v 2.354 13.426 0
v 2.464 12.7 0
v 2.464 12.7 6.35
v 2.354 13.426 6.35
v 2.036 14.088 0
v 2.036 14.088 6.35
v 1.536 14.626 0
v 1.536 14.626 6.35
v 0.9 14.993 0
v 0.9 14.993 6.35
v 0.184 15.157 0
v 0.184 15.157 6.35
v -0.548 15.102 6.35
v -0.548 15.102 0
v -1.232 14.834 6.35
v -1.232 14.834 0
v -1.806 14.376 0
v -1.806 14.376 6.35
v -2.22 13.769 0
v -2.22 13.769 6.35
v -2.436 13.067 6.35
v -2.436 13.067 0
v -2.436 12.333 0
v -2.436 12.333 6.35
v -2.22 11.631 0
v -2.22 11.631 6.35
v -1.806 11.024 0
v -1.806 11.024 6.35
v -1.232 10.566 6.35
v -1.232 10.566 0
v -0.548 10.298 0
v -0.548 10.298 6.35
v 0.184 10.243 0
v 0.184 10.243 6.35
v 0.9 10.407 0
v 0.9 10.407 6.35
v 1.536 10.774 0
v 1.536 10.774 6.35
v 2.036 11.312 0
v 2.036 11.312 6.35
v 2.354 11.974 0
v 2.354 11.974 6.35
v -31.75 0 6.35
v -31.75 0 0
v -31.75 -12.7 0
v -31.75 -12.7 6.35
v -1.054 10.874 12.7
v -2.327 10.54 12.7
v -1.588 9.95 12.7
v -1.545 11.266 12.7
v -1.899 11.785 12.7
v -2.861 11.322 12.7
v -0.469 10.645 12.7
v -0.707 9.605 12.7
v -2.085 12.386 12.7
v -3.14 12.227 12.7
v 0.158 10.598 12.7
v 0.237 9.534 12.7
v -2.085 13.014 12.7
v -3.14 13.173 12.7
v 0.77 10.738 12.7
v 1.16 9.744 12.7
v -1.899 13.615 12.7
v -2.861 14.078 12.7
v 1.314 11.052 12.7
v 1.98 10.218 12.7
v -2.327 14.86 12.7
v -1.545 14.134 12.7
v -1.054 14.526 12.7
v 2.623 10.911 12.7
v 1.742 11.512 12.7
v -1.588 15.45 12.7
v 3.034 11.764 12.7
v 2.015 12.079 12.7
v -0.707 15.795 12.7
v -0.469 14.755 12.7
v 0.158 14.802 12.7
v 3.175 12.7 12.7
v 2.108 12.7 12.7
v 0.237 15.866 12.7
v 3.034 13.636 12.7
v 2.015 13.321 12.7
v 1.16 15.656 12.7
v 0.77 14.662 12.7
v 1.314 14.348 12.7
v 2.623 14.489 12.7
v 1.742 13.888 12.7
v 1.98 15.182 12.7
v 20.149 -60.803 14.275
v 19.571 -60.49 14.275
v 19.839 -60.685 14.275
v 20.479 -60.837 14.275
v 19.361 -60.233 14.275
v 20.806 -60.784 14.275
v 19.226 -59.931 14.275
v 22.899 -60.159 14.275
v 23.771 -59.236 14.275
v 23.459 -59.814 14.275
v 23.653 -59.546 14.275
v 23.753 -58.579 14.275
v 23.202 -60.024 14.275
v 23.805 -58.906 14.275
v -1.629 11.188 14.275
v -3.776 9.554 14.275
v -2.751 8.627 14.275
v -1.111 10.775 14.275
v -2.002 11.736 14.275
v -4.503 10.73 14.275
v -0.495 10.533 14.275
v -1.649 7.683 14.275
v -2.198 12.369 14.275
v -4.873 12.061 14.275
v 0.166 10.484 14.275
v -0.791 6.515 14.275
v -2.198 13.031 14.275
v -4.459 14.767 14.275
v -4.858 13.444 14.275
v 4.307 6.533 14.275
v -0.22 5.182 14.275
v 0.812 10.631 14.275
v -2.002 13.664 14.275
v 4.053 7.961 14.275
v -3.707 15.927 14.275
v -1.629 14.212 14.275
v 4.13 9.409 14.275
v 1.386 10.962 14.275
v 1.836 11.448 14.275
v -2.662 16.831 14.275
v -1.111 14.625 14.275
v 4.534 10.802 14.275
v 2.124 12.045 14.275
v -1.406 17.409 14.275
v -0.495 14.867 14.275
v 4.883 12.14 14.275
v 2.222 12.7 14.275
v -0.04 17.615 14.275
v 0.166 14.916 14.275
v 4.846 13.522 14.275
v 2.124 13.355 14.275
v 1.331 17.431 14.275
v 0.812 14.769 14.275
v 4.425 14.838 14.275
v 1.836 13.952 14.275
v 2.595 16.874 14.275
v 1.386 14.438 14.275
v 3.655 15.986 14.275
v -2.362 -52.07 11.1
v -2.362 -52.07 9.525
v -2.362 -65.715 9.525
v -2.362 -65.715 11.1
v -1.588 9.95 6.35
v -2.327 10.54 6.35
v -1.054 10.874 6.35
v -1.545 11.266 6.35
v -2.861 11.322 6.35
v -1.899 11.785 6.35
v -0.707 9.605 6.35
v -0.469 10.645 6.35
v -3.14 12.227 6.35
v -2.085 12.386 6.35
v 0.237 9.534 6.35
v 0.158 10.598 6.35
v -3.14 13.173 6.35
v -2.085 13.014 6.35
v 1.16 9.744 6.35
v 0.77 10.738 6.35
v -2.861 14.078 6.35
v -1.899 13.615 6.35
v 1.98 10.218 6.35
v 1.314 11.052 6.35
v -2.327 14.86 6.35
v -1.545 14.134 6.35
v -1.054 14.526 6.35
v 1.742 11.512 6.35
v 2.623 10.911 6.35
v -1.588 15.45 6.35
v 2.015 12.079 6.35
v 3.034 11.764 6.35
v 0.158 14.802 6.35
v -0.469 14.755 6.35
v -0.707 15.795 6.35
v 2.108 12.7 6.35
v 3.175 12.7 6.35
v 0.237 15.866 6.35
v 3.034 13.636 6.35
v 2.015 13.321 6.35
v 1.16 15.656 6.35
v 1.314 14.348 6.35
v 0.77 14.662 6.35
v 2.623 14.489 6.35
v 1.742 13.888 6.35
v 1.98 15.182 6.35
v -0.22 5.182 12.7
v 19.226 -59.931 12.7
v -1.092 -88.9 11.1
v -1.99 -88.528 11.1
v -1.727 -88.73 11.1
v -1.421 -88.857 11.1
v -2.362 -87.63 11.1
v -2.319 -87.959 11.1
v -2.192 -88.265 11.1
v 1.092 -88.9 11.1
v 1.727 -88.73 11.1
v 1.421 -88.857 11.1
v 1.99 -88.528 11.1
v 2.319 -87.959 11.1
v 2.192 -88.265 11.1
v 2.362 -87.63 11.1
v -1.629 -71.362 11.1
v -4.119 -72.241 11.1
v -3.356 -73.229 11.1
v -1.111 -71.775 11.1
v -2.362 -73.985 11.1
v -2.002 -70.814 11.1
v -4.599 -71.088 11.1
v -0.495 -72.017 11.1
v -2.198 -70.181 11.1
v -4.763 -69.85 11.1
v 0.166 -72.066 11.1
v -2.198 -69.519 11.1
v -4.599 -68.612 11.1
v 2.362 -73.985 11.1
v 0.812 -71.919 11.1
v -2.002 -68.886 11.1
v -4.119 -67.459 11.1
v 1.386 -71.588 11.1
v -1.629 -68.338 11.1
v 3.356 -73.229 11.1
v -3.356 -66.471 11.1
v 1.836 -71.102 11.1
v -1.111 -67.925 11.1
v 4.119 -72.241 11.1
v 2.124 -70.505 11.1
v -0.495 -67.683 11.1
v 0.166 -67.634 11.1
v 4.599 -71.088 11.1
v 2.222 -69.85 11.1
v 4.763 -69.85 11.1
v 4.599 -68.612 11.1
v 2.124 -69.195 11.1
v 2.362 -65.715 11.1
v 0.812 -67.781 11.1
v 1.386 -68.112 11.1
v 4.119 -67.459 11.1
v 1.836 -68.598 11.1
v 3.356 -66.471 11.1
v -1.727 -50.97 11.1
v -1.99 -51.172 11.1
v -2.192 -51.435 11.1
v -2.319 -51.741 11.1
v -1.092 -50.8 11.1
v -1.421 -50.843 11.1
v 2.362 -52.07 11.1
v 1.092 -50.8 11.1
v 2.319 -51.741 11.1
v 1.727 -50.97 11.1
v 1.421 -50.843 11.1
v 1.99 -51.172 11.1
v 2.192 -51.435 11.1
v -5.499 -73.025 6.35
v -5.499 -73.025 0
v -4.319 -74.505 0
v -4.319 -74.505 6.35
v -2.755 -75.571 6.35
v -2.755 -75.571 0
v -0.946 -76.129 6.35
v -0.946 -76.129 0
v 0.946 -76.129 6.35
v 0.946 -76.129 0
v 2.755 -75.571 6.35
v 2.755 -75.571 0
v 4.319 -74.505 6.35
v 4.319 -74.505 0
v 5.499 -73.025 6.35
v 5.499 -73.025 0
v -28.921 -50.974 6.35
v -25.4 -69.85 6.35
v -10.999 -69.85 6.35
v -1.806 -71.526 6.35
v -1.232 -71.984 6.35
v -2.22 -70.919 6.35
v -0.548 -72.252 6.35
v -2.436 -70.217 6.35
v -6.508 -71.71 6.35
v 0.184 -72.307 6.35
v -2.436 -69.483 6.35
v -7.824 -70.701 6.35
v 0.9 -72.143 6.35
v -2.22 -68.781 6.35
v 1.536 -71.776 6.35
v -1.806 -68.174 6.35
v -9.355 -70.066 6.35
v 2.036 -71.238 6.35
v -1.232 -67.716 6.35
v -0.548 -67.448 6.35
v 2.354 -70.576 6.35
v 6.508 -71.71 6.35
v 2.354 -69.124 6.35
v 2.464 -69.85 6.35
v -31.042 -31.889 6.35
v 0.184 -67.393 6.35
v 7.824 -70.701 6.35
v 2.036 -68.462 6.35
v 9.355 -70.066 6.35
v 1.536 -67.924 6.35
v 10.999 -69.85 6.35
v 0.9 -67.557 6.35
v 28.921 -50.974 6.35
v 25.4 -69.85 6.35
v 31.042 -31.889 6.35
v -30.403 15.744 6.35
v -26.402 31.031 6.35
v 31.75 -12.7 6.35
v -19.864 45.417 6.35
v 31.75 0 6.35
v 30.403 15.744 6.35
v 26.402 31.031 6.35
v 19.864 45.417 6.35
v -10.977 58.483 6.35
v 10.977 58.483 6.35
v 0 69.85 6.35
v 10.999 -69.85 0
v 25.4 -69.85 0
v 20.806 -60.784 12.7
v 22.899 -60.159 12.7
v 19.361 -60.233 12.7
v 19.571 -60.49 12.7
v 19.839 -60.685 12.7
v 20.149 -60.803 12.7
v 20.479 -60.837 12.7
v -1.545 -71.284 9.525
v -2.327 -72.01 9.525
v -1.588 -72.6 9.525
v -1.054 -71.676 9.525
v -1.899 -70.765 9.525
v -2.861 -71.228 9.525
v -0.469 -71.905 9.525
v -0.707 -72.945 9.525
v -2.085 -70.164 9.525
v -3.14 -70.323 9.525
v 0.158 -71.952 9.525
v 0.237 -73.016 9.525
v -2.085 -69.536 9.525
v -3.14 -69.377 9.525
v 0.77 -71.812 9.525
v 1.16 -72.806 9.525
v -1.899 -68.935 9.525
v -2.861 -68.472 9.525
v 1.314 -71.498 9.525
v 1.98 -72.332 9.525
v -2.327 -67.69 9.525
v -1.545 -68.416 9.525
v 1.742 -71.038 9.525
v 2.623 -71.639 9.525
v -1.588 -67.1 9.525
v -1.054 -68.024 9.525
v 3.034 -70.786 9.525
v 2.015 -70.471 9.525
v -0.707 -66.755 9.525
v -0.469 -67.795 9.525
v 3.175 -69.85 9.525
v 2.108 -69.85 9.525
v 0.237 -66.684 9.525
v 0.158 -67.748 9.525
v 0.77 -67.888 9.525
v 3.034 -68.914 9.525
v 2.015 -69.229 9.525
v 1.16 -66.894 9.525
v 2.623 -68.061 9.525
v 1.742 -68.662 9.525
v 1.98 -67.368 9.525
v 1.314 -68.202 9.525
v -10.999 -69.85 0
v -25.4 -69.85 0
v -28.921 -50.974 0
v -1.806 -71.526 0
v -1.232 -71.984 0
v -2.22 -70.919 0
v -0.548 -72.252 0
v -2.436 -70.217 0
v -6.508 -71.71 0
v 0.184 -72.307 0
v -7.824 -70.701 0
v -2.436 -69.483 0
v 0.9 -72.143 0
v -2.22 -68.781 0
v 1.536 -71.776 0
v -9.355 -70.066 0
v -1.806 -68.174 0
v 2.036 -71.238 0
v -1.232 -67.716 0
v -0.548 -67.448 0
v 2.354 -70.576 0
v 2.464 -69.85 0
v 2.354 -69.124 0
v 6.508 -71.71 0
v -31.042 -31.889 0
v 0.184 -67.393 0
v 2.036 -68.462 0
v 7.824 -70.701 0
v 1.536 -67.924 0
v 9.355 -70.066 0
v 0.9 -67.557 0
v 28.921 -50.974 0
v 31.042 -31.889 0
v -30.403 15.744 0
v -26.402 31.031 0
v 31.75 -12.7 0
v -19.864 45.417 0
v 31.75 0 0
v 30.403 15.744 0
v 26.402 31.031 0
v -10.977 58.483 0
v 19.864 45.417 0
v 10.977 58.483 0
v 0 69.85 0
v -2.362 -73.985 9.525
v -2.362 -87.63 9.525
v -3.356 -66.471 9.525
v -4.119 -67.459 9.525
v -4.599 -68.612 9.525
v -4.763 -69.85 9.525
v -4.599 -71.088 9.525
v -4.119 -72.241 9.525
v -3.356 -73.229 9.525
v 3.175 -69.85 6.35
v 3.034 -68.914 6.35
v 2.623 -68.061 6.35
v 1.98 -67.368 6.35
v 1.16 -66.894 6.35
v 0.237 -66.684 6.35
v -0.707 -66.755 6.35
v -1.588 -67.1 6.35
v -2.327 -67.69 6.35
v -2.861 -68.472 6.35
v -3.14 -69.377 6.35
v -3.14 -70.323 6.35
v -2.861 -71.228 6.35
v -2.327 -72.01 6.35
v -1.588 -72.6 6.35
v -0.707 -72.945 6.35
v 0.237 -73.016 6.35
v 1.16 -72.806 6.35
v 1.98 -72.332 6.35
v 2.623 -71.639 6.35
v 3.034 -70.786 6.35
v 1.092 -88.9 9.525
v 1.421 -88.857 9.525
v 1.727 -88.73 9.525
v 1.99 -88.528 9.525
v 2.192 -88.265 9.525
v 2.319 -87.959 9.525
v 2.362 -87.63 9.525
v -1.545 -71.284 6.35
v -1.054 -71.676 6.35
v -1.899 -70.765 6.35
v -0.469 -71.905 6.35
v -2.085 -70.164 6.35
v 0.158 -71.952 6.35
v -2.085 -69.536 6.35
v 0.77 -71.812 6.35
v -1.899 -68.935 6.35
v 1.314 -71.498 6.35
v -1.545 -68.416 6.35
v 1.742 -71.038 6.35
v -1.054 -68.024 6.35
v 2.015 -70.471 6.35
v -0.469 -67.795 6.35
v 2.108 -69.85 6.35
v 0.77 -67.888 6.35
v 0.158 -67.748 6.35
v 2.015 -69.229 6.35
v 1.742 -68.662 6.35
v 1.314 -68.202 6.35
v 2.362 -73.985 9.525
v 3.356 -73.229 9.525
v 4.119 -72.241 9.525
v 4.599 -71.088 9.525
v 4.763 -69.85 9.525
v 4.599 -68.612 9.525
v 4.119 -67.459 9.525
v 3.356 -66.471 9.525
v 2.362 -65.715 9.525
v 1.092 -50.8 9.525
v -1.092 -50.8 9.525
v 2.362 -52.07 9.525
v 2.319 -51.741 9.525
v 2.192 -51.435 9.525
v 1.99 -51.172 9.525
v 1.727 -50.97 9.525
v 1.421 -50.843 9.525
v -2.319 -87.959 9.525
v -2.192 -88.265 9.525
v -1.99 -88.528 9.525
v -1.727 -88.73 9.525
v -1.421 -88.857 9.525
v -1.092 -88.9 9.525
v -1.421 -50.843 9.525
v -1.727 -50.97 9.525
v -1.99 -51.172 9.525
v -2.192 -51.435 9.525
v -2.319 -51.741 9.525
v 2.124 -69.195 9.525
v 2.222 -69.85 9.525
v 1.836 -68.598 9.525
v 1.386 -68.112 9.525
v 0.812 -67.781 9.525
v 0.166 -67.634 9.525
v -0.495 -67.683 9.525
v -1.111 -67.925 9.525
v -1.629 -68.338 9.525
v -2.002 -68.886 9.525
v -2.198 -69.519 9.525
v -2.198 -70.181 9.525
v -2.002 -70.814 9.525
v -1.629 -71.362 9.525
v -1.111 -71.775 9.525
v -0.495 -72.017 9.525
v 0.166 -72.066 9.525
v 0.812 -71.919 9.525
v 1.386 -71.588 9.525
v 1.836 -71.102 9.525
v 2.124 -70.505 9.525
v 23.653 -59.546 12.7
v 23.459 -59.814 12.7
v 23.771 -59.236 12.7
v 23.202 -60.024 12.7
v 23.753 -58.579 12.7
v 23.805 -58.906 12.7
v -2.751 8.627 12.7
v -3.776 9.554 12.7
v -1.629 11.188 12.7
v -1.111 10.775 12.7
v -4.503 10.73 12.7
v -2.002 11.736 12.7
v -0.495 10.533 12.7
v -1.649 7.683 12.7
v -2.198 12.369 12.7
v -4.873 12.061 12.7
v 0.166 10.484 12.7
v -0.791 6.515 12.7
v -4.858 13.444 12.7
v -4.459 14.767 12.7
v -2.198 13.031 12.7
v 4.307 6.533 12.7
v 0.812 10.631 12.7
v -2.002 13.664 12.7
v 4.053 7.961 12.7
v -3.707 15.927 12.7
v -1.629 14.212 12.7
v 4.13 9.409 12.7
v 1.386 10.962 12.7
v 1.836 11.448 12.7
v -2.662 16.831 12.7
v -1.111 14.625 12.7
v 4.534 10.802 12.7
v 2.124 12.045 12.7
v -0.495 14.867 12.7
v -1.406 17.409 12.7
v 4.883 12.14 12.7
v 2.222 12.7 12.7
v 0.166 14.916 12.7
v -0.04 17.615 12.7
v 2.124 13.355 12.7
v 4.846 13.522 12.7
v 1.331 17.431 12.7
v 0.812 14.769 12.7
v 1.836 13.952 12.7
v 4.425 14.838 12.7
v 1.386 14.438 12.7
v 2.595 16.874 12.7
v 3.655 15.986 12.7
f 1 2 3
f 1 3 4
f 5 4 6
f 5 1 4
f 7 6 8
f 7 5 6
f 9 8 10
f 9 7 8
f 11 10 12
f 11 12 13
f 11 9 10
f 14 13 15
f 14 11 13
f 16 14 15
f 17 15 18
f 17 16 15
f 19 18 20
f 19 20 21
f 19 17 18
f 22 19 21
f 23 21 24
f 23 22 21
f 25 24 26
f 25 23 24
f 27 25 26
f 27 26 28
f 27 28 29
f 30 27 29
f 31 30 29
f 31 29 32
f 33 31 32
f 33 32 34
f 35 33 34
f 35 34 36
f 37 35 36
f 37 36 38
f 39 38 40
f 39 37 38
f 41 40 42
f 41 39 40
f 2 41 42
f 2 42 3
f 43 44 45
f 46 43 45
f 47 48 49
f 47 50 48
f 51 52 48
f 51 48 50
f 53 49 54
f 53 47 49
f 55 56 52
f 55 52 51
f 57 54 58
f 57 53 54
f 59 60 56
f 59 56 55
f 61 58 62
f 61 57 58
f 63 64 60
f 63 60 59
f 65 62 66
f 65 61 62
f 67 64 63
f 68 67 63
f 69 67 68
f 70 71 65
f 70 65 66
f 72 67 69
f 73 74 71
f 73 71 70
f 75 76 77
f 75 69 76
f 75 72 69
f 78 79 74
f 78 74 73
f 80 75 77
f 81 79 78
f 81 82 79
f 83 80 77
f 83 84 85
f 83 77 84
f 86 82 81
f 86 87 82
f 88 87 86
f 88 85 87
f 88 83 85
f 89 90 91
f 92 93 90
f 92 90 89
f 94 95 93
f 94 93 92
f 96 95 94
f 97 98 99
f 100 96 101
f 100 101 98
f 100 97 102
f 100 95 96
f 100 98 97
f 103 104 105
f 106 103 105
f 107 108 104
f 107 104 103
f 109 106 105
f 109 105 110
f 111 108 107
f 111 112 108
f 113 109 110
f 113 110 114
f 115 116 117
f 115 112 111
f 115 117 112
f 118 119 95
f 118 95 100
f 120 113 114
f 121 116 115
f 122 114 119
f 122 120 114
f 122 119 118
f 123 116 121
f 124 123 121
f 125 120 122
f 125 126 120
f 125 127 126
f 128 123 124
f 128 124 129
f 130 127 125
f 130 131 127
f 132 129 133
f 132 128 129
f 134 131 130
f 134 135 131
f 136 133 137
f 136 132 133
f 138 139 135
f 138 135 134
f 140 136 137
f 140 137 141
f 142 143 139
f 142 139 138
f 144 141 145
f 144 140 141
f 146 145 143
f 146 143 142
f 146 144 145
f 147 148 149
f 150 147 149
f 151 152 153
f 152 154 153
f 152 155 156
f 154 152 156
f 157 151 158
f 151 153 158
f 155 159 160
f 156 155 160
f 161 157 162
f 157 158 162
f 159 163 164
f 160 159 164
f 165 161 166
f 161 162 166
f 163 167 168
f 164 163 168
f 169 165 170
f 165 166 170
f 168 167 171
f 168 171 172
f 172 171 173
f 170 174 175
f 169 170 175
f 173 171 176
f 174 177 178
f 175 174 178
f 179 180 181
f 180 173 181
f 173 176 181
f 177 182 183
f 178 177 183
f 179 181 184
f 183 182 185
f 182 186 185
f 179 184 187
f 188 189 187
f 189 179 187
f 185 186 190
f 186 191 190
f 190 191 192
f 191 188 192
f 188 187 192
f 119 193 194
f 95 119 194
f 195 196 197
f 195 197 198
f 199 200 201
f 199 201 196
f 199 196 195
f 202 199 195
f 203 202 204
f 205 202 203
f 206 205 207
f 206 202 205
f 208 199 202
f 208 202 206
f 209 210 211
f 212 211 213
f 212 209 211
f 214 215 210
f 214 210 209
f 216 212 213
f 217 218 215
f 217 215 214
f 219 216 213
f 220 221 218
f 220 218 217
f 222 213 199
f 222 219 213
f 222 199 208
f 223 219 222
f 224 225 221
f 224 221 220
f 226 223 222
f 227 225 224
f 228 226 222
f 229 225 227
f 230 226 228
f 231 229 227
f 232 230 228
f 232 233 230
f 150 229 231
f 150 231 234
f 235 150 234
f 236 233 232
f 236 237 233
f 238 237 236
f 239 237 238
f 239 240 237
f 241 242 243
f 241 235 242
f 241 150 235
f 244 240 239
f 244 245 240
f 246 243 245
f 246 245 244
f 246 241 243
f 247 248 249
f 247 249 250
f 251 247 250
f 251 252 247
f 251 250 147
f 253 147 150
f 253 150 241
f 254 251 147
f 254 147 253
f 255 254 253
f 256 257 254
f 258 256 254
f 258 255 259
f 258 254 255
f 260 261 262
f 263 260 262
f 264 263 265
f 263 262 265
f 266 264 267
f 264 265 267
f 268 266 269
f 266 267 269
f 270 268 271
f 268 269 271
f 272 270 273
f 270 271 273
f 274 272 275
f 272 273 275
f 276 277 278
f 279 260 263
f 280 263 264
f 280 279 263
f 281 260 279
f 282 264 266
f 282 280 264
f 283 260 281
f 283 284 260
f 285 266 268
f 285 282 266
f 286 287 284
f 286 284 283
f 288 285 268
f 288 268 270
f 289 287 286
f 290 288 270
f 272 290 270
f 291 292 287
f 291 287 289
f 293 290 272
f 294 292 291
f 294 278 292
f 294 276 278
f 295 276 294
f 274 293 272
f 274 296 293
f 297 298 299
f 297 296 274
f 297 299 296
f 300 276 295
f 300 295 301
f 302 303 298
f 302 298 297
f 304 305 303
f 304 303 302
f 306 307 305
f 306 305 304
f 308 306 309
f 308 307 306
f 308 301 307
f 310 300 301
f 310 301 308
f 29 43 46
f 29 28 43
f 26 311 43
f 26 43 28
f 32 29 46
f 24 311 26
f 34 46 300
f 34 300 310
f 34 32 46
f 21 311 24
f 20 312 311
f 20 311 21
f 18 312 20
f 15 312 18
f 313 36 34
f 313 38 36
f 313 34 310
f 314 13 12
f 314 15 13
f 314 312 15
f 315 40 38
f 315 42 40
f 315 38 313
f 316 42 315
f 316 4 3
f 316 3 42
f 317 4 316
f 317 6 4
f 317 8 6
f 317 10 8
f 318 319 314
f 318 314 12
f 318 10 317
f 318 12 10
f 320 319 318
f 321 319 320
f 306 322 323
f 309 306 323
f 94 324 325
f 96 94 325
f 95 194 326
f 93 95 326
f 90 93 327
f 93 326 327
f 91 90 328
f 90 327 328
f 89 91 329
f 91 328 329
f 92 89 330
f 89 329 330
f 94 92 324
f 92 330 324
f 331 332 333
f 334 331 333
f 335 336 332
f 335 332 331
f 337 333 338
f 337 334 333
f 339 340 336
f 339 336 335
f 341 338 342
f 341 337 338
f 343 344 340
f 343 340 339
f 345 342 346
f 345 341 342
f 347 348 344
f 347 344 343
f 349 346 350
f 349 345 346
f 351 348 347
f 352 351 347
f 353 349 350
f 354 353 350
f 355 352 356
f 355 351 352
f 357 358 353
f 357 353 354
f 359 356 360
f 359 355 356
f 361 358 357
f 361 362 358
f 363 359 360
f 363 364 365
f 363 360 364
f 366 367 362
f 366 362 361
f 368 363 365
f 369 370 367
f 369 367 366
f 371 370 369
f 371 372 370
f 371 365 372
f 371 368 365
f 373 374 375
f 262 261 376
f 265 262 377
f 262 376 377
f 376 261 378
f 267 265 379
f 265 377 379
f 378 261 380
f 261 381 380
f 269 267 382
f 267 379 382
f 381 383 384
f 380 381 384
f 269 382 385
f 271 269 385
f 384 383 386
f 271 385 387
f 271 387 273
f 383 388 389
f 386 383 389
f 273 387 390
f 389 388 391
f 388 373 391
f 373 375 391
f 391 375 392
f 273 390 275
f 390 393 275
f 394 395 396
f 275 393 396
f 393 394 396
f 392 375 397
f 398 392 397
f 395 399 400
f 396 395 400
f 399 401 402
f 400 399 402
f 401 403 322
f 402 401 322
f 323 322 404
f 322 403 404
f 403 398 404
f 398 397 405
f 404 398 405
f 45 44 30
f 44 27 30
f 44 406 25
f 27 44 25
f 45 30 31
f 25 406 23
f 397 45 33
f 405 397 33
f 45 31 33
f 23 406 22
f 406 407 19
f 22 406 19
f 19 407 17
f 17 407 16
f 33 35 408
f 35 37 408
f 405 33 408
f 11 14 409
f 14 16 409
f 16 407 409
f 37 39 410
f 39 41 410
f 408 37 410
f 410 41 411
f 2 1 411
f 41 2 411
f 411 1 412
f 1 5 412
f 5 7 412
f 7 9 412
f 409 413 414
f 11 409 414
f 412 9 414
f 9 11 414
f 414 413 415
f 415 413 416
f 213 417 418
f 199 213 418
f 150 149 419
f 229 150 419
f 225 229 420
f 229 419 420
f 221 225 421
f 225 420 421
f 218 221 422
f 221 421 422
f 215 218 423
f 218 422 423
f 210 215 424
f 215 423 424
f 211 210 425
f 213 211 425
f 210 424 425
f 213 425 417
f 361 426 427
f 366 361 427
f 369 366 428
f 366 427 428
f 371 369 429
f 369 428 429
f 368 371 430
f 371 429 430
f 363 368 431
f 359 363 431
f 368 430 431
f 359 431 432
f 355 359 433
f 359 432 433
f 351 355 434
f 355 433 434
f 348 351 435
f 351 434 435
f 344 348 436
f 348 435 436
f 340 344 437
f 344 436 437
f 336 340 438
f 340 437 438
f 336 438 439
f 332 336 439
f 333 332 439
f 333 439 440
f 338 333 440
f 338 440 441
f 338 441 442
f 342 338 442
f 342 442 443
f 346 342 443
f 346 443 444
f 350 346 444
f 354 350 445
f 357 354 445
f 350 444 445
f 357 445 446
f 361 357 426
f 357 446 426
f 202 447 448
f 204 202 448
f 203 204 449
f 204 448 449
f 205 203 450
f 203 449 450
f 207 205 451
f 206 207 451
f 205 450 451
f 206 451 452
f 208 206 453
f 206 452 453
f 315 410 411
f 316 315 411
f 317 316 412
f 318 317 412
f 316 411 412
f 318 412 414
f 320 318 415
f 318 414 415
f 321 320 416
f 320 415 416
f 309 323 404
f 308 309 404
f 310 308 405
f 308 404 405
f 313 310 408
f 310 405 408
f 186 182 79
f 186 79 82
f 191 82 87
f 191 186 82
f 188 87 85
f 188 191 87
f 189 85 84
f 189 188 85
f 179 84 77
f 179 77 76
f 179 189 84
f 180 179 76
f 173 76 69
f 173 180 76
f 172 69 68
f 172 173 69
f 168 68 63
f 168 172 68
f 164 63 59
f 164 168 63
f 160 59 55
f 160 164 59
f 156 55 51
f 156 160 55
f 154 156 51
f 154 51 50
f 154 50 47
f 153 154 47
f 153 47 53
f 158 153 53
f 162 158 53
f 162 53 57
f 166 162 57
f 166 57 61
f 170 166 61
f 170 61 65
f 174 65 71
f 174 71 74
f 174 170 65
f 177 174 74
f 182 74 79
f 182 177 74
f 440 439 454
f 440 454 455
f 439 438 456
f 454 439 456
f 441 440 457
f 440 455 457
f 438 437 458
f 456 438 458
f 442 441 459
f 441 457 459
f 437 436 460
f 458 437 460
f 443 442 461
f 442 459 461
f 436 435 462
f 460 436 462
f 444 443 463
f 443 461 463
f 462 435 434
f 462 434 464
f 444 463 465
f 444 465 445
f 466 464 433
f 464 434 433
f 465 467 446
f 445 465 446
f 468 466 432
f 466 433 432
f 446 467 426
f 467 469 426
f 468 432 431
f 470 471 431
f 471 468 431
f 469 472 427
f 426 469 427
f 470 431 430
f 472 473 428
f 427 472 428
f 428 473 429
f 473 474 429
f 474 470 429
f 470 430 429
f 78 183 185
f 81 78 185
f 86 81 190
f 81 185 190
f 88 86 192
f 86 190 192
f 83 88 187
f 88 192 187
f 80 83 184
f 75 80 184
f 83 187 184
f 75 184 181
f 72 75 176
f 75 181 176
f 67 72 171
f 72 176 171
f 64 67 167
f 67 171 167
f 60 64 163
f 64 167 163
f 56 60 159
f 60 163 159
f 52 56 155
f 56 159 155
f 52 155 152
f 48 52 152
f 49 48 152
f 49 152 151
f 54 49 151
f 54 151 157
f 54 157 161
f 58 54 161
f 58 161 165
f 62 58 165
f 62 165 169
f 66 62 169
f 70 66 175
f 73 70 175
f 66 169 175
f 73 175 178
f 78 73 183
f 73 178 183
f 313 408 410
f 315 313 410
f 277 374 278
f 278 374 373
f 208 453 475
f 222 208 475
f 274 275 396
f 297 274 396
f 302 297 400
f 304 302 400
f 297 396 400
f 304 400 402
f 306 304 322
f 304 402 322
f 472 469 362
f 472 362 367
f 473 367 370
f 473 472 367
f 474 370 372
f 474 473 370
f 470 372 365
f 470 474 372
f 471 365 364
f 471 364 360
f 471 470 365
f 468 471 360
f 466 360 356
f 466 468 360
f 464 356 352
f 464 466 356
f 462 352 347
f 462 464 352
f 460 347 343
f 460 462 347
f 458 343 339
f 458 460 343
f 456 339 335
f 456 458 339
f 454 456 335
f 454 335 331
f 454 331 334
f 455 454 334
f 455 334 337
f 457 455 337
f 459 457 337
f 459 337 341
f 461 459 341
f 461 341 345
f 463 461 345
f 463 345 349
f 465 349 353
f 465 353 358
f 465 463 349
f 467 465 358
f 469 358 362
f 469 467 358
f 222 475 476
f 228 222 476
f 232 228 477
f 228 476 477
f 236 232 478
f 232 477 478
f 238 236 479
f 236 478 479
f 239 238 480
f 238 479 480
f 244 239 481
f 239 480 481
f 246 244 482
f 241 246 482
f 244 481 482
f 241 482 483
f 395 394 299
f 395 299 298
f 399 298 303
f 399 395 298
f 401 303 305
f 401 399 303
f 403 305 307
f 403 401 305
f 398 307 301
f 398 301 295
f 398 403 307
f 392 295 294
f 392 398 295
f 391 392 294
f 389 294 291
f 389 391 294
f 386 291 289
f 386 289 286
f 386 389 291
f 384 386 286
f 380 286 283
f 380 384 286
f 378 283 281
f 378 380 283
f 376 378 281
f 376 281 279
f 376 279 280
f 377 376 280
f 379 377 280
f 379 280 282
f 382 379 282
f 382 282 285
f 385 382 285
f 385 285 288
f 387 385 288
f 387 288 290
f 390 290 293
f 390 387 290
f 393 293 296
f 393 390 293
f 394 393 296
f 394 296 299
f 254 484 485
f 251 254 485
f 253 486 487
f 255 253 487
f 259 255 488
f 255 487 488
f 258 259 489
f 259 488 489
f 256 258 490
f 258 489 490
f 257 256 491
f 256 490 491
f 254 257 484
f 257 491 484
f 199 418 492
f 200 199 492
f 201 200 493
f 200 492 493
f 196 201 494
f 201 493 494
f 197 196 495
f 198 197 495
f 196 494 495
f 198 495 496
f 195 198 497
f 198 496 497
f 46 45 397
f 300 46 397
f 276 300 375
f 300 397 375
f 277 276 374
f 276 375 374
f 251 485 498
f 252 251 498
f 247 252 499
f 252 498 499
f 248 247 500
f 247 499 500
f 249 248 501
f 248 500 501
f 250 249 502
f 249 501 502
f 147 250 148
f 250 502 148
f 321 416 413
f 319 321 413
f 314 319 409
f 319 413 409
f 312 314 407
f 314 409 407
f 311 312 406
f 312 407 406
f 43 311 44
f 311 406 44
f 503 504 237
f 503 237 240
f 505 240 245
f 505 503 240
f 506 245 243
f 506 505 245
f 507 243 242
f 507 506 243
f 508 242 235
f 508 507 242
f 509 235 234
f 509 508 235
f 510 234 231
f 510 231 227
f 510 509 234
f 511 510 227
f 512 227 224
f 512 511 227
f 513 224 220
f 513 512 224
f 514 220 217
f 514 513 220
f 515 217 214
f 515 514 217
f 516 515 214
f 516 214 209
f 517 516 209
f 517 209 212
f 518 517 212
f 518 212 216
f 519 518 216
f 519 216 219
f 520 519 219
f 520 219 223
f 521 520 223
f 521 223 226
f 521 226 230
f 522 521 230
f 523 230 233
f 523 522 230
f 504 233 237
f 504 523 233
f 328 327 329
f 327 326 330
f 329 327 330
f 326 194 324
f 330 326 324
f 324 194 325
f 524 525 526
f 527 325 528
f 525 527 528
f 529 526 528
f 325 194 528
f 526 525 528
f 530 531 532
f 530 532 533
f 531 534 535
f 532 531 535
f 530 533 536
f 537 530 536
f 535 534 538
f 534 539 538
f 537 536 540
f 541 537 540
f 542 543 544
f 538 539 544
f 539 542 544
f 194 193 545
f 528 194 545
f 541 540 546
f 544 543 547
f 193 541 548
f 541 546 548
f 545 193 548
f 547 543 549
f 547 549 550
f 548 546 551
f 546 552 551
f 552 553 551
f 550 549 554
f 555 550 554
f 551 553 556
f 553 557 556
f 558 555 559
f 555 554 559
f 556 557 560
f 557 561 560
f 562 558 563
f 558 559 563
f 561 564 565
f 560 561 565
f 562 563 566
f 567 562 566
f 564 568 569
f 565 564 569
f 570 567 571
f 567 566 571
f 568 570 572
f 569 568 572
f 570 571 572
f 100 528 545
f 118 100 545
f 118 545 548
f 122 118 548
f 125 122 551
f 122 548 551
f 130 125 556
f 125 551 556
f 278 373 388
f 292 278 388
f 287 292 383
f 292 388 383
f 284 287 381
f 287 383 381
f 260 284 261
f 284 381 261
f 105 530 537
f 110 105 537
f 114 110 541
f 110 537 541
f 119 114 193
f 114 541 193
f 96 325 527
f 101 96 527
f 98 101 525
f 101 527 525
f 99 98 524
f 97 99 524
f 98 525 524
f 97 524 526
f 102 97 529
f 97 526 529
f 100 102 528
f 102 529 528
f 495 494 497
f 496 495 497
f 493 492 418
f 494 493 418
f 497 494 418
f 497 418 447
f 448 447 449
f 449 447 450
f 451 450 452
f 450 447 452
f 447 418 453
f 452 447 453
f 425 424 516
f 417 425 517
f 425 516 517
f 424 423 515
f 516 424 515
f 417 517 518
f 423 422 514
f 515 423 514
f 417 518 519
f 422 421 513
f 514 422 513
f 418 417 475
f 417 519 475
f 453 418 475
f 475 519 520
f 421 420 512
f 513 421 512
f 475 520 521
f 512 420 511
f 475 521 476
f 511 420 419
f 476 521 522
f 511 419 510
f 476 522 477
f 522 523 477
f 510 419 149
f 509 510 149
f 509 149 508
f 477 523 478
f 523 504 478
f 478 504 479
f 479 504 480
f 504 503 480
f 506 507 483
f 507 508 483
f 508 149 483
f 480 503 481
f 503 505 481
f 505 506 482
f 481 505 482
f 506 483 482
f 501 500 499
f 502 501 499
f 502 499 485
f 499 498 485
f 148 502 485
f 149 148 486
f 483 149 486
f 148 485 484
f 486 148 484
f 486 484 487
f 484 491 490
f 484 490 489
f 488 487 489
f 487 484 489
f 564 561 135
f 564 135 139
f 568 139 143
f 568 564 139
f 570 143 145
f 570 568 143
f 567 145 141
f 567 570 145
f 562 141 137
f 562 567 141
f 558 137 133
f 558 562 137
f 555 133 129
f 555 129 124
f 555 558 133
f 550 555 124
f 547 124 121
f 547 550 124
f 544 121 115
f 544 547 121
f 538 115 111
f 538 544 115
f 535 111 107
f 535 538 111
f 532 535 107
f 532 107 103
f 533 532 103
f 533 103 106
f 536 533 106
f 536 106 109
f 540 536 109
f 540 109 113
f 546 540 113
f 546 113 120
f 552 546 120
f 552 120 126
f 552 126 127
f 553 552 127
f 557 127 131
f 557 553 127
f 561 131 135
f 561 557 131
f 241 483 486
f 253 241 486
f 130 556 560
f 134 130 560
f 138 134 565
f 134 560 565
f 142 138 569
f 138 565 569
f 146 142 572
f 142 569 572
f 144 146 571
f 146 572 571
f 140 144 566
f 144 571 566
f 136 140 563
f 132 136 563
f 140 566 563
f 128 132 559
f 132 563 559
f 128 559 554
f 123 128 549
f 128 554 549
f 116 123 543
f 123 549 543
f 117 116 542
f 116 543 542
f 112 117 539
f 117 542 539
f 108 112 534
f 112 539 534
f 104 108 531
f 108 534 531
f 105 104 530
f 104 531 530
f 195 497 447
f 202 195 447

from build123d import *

# Parameters (mm, degrees)
F0_R     = 2.4638
F1_DEPTH = 6.35
F2_R     = 3.175
F2_R_2   = 2.1082
F3_DEPTH = 6.35
F4_R     = 3.175
F4_R_2   = 2.1082
F5_DEPTH = 3.175
F6_R     = 3.175
F6_R_2   = 2.2225
F7_DEPTH = 1.5748
F8_R     = 2.2225
F9_DEPTH = 1.5748


with BuildPart() as f1:
    # F0 (on Top) → F1 (new body)
    with BuildSketch(Plane.XY):
        with BuildLine():
            ThreePointArc((0, 69.85), (-23.4400761256, 38.3636709662), (-31.75, 0))
            Line((-31.75, 0), (-31.75, -12.7))
            ThreePointArc((-31.75, -12.7), (-30.1576303223, -41.4508478136), (-25.4, -69.85))
            Line((-25.4, -69.85), (-10.9985226281, -69.85))
            ThreePointArc((-10.9985226281, -69.85), (-7.8235226281, -70.700738686), (-5.499261314, -73.025))
            ThreePointArc((-5.499261314, -73.025), (0, -76.2), (5.499261314, -73.025))
            ThreePointArc((5.499261314, -73.025), (7.8235226281, -70.700738686), (10.9985226281, -69.85))
            Line((10.9985226281, -69.85), (25.4, -69.85))
            ThreePointArc((25.4, -69.85), (30.1576303223, -41.4508478136), (31.75, -12.7))
            Line((31.75, -12.7), (31.75, 0))
            ThreePointArc((31.75, 0), (23.4400761256, 38.3636709662), (0, 69.85))
        make_face()
        with Locations((0, -69.85)):
            Circle(F0_R, mode=Mode.SUBTRACT)
        with Locations((0, 12.7)):
            Circle(F0_R, mode=Mode.SUBTRACT)
    extrude(amount=F1_DEPTH)


with BuildPart() as f3:
    # F2 (on face) → F3 (new body)
    with BuildSketch(Plane.XY.offset(6.35)):
        with Locations((0, 12.7)):
            Circle(F2_R)
        with Locations((0, 12.7)):
            Circle(F2_R_2, mode=Mode.SUBTRACT)
    extrude(amount=F3_DEPTH)


with BuildPart() as f5:
    # F4 (on face) → F5 (new body)
    with BuildSketch(Plane.XY.offset(6.35)):
        with Locations((0, -69.85)):
            Circle(F4_R)
        with Locations((0, -69.85)):
            Circle(F4_R_2, mode=Mode.SUBTRACT)
    extrude(amount=F5_DEPTH)


with BuildPart() as f7:
    # F6 (on face) → F7 (new body)
    with BuildSketch(Plane.XY.offset(12.7)):
        with BuildLine():
            ThreePointArc((4.3069303436, 6.5334869638), (4.0503288857, 8.6875839131), (4.5337821143, 10.8023536288))
            ThreePointArc((4.5337821143, 10.8023536288), (-1.4064564275, 17.4093653848), (-2.7506026748, 8.6268652201))
            ThreePointArc((-2.7506026748, 8.6268652201), (-1.1866100755, 7.1235671378), (-0.2199014991, 5.1815443514))
            Line((-0.2199014991, 5.1815443514), (19.2259299593, -59.930693581))
            ThreePointArc((19.2259299593, -59.930693581), (19.8393294589, -60.6847201051), (20.8062456731, -60.7841584278))
            Line((20.8062456731, -60.7841584278), (22.8992969552, -60.1590666822))
            ThreePointArc((22.8992969552, -60.1590666822), (23.6533234794, -59.5456671826), (23.7527618021, -58.5787509685))
            Line((23.7527618021, -58.5787509685), (4.3069303436, 6.5334869638))
        make_face()
        with Locations((0, 12.7)):
            Circle(F6_R, mode=Mode.SUBTRACT)
        with Locations((0, 12.7)):
            Circle(F6_R)
        with Locations((0, 12.7)):
            Circle(F6_R_2, mode=Mode.SUBTRACT)
    extrude(amount=F7_DEPTH)


with BuildPart() as f9:
    # F8 (on face) → F9 (new body)
    with BuildSketch(Plane.XY.offset(9.525)):
        with BuildLine():
            Line((-2.3622, -52.07), (-2.3622, -65.714613995))
            ThreePointArc((-2.3622, -65.714613995), (-4.7625, -69.85), (-2.3622, -73.985386005))
            Line((-2.3622, -73.985386005), (-2.3622, -87.63))
            ThreePointArc((-2.3622, -87.63), (-1.9902256121, -88.5280256121), (-1.0922, -88.9))
            Line((-1.0922, -88.9), (1.0922, -88.9))
            ThreePointArc((1.0922, -88.9), (1.9902256121, -88.5280256121), (2.3622, -87.63))
            Line((2.3622, -87.63), (2.3622, -73.985386005))
            ThreePointArc((2.3622, -73.985386005), (4.7625, -69.85), (2.3622, -65.714613995))
            Line((2.3622, -65.714613995), (2.3622, -52.07))
            ThreePointArc((2.3622, -52.07), (1.9902256121, -51.1719743879), (1.0922, -50.8))
            Line((1.0922, -50.8), (-1.0922, -50.8))
            ThreePointArc((-1.0922, -50.8), (-1.9902256121, -51.1719743879), (-2.3622, -52.07))
        make_face()
        with Locations((0, -69.85)):
            Circle(F8_R, mode=Mode.SUBTRACT)
    extrude(amount=F9_DEPTH)


solid = Compound([f1.part, f3.part, f5.part, f7.part, f9.part])
